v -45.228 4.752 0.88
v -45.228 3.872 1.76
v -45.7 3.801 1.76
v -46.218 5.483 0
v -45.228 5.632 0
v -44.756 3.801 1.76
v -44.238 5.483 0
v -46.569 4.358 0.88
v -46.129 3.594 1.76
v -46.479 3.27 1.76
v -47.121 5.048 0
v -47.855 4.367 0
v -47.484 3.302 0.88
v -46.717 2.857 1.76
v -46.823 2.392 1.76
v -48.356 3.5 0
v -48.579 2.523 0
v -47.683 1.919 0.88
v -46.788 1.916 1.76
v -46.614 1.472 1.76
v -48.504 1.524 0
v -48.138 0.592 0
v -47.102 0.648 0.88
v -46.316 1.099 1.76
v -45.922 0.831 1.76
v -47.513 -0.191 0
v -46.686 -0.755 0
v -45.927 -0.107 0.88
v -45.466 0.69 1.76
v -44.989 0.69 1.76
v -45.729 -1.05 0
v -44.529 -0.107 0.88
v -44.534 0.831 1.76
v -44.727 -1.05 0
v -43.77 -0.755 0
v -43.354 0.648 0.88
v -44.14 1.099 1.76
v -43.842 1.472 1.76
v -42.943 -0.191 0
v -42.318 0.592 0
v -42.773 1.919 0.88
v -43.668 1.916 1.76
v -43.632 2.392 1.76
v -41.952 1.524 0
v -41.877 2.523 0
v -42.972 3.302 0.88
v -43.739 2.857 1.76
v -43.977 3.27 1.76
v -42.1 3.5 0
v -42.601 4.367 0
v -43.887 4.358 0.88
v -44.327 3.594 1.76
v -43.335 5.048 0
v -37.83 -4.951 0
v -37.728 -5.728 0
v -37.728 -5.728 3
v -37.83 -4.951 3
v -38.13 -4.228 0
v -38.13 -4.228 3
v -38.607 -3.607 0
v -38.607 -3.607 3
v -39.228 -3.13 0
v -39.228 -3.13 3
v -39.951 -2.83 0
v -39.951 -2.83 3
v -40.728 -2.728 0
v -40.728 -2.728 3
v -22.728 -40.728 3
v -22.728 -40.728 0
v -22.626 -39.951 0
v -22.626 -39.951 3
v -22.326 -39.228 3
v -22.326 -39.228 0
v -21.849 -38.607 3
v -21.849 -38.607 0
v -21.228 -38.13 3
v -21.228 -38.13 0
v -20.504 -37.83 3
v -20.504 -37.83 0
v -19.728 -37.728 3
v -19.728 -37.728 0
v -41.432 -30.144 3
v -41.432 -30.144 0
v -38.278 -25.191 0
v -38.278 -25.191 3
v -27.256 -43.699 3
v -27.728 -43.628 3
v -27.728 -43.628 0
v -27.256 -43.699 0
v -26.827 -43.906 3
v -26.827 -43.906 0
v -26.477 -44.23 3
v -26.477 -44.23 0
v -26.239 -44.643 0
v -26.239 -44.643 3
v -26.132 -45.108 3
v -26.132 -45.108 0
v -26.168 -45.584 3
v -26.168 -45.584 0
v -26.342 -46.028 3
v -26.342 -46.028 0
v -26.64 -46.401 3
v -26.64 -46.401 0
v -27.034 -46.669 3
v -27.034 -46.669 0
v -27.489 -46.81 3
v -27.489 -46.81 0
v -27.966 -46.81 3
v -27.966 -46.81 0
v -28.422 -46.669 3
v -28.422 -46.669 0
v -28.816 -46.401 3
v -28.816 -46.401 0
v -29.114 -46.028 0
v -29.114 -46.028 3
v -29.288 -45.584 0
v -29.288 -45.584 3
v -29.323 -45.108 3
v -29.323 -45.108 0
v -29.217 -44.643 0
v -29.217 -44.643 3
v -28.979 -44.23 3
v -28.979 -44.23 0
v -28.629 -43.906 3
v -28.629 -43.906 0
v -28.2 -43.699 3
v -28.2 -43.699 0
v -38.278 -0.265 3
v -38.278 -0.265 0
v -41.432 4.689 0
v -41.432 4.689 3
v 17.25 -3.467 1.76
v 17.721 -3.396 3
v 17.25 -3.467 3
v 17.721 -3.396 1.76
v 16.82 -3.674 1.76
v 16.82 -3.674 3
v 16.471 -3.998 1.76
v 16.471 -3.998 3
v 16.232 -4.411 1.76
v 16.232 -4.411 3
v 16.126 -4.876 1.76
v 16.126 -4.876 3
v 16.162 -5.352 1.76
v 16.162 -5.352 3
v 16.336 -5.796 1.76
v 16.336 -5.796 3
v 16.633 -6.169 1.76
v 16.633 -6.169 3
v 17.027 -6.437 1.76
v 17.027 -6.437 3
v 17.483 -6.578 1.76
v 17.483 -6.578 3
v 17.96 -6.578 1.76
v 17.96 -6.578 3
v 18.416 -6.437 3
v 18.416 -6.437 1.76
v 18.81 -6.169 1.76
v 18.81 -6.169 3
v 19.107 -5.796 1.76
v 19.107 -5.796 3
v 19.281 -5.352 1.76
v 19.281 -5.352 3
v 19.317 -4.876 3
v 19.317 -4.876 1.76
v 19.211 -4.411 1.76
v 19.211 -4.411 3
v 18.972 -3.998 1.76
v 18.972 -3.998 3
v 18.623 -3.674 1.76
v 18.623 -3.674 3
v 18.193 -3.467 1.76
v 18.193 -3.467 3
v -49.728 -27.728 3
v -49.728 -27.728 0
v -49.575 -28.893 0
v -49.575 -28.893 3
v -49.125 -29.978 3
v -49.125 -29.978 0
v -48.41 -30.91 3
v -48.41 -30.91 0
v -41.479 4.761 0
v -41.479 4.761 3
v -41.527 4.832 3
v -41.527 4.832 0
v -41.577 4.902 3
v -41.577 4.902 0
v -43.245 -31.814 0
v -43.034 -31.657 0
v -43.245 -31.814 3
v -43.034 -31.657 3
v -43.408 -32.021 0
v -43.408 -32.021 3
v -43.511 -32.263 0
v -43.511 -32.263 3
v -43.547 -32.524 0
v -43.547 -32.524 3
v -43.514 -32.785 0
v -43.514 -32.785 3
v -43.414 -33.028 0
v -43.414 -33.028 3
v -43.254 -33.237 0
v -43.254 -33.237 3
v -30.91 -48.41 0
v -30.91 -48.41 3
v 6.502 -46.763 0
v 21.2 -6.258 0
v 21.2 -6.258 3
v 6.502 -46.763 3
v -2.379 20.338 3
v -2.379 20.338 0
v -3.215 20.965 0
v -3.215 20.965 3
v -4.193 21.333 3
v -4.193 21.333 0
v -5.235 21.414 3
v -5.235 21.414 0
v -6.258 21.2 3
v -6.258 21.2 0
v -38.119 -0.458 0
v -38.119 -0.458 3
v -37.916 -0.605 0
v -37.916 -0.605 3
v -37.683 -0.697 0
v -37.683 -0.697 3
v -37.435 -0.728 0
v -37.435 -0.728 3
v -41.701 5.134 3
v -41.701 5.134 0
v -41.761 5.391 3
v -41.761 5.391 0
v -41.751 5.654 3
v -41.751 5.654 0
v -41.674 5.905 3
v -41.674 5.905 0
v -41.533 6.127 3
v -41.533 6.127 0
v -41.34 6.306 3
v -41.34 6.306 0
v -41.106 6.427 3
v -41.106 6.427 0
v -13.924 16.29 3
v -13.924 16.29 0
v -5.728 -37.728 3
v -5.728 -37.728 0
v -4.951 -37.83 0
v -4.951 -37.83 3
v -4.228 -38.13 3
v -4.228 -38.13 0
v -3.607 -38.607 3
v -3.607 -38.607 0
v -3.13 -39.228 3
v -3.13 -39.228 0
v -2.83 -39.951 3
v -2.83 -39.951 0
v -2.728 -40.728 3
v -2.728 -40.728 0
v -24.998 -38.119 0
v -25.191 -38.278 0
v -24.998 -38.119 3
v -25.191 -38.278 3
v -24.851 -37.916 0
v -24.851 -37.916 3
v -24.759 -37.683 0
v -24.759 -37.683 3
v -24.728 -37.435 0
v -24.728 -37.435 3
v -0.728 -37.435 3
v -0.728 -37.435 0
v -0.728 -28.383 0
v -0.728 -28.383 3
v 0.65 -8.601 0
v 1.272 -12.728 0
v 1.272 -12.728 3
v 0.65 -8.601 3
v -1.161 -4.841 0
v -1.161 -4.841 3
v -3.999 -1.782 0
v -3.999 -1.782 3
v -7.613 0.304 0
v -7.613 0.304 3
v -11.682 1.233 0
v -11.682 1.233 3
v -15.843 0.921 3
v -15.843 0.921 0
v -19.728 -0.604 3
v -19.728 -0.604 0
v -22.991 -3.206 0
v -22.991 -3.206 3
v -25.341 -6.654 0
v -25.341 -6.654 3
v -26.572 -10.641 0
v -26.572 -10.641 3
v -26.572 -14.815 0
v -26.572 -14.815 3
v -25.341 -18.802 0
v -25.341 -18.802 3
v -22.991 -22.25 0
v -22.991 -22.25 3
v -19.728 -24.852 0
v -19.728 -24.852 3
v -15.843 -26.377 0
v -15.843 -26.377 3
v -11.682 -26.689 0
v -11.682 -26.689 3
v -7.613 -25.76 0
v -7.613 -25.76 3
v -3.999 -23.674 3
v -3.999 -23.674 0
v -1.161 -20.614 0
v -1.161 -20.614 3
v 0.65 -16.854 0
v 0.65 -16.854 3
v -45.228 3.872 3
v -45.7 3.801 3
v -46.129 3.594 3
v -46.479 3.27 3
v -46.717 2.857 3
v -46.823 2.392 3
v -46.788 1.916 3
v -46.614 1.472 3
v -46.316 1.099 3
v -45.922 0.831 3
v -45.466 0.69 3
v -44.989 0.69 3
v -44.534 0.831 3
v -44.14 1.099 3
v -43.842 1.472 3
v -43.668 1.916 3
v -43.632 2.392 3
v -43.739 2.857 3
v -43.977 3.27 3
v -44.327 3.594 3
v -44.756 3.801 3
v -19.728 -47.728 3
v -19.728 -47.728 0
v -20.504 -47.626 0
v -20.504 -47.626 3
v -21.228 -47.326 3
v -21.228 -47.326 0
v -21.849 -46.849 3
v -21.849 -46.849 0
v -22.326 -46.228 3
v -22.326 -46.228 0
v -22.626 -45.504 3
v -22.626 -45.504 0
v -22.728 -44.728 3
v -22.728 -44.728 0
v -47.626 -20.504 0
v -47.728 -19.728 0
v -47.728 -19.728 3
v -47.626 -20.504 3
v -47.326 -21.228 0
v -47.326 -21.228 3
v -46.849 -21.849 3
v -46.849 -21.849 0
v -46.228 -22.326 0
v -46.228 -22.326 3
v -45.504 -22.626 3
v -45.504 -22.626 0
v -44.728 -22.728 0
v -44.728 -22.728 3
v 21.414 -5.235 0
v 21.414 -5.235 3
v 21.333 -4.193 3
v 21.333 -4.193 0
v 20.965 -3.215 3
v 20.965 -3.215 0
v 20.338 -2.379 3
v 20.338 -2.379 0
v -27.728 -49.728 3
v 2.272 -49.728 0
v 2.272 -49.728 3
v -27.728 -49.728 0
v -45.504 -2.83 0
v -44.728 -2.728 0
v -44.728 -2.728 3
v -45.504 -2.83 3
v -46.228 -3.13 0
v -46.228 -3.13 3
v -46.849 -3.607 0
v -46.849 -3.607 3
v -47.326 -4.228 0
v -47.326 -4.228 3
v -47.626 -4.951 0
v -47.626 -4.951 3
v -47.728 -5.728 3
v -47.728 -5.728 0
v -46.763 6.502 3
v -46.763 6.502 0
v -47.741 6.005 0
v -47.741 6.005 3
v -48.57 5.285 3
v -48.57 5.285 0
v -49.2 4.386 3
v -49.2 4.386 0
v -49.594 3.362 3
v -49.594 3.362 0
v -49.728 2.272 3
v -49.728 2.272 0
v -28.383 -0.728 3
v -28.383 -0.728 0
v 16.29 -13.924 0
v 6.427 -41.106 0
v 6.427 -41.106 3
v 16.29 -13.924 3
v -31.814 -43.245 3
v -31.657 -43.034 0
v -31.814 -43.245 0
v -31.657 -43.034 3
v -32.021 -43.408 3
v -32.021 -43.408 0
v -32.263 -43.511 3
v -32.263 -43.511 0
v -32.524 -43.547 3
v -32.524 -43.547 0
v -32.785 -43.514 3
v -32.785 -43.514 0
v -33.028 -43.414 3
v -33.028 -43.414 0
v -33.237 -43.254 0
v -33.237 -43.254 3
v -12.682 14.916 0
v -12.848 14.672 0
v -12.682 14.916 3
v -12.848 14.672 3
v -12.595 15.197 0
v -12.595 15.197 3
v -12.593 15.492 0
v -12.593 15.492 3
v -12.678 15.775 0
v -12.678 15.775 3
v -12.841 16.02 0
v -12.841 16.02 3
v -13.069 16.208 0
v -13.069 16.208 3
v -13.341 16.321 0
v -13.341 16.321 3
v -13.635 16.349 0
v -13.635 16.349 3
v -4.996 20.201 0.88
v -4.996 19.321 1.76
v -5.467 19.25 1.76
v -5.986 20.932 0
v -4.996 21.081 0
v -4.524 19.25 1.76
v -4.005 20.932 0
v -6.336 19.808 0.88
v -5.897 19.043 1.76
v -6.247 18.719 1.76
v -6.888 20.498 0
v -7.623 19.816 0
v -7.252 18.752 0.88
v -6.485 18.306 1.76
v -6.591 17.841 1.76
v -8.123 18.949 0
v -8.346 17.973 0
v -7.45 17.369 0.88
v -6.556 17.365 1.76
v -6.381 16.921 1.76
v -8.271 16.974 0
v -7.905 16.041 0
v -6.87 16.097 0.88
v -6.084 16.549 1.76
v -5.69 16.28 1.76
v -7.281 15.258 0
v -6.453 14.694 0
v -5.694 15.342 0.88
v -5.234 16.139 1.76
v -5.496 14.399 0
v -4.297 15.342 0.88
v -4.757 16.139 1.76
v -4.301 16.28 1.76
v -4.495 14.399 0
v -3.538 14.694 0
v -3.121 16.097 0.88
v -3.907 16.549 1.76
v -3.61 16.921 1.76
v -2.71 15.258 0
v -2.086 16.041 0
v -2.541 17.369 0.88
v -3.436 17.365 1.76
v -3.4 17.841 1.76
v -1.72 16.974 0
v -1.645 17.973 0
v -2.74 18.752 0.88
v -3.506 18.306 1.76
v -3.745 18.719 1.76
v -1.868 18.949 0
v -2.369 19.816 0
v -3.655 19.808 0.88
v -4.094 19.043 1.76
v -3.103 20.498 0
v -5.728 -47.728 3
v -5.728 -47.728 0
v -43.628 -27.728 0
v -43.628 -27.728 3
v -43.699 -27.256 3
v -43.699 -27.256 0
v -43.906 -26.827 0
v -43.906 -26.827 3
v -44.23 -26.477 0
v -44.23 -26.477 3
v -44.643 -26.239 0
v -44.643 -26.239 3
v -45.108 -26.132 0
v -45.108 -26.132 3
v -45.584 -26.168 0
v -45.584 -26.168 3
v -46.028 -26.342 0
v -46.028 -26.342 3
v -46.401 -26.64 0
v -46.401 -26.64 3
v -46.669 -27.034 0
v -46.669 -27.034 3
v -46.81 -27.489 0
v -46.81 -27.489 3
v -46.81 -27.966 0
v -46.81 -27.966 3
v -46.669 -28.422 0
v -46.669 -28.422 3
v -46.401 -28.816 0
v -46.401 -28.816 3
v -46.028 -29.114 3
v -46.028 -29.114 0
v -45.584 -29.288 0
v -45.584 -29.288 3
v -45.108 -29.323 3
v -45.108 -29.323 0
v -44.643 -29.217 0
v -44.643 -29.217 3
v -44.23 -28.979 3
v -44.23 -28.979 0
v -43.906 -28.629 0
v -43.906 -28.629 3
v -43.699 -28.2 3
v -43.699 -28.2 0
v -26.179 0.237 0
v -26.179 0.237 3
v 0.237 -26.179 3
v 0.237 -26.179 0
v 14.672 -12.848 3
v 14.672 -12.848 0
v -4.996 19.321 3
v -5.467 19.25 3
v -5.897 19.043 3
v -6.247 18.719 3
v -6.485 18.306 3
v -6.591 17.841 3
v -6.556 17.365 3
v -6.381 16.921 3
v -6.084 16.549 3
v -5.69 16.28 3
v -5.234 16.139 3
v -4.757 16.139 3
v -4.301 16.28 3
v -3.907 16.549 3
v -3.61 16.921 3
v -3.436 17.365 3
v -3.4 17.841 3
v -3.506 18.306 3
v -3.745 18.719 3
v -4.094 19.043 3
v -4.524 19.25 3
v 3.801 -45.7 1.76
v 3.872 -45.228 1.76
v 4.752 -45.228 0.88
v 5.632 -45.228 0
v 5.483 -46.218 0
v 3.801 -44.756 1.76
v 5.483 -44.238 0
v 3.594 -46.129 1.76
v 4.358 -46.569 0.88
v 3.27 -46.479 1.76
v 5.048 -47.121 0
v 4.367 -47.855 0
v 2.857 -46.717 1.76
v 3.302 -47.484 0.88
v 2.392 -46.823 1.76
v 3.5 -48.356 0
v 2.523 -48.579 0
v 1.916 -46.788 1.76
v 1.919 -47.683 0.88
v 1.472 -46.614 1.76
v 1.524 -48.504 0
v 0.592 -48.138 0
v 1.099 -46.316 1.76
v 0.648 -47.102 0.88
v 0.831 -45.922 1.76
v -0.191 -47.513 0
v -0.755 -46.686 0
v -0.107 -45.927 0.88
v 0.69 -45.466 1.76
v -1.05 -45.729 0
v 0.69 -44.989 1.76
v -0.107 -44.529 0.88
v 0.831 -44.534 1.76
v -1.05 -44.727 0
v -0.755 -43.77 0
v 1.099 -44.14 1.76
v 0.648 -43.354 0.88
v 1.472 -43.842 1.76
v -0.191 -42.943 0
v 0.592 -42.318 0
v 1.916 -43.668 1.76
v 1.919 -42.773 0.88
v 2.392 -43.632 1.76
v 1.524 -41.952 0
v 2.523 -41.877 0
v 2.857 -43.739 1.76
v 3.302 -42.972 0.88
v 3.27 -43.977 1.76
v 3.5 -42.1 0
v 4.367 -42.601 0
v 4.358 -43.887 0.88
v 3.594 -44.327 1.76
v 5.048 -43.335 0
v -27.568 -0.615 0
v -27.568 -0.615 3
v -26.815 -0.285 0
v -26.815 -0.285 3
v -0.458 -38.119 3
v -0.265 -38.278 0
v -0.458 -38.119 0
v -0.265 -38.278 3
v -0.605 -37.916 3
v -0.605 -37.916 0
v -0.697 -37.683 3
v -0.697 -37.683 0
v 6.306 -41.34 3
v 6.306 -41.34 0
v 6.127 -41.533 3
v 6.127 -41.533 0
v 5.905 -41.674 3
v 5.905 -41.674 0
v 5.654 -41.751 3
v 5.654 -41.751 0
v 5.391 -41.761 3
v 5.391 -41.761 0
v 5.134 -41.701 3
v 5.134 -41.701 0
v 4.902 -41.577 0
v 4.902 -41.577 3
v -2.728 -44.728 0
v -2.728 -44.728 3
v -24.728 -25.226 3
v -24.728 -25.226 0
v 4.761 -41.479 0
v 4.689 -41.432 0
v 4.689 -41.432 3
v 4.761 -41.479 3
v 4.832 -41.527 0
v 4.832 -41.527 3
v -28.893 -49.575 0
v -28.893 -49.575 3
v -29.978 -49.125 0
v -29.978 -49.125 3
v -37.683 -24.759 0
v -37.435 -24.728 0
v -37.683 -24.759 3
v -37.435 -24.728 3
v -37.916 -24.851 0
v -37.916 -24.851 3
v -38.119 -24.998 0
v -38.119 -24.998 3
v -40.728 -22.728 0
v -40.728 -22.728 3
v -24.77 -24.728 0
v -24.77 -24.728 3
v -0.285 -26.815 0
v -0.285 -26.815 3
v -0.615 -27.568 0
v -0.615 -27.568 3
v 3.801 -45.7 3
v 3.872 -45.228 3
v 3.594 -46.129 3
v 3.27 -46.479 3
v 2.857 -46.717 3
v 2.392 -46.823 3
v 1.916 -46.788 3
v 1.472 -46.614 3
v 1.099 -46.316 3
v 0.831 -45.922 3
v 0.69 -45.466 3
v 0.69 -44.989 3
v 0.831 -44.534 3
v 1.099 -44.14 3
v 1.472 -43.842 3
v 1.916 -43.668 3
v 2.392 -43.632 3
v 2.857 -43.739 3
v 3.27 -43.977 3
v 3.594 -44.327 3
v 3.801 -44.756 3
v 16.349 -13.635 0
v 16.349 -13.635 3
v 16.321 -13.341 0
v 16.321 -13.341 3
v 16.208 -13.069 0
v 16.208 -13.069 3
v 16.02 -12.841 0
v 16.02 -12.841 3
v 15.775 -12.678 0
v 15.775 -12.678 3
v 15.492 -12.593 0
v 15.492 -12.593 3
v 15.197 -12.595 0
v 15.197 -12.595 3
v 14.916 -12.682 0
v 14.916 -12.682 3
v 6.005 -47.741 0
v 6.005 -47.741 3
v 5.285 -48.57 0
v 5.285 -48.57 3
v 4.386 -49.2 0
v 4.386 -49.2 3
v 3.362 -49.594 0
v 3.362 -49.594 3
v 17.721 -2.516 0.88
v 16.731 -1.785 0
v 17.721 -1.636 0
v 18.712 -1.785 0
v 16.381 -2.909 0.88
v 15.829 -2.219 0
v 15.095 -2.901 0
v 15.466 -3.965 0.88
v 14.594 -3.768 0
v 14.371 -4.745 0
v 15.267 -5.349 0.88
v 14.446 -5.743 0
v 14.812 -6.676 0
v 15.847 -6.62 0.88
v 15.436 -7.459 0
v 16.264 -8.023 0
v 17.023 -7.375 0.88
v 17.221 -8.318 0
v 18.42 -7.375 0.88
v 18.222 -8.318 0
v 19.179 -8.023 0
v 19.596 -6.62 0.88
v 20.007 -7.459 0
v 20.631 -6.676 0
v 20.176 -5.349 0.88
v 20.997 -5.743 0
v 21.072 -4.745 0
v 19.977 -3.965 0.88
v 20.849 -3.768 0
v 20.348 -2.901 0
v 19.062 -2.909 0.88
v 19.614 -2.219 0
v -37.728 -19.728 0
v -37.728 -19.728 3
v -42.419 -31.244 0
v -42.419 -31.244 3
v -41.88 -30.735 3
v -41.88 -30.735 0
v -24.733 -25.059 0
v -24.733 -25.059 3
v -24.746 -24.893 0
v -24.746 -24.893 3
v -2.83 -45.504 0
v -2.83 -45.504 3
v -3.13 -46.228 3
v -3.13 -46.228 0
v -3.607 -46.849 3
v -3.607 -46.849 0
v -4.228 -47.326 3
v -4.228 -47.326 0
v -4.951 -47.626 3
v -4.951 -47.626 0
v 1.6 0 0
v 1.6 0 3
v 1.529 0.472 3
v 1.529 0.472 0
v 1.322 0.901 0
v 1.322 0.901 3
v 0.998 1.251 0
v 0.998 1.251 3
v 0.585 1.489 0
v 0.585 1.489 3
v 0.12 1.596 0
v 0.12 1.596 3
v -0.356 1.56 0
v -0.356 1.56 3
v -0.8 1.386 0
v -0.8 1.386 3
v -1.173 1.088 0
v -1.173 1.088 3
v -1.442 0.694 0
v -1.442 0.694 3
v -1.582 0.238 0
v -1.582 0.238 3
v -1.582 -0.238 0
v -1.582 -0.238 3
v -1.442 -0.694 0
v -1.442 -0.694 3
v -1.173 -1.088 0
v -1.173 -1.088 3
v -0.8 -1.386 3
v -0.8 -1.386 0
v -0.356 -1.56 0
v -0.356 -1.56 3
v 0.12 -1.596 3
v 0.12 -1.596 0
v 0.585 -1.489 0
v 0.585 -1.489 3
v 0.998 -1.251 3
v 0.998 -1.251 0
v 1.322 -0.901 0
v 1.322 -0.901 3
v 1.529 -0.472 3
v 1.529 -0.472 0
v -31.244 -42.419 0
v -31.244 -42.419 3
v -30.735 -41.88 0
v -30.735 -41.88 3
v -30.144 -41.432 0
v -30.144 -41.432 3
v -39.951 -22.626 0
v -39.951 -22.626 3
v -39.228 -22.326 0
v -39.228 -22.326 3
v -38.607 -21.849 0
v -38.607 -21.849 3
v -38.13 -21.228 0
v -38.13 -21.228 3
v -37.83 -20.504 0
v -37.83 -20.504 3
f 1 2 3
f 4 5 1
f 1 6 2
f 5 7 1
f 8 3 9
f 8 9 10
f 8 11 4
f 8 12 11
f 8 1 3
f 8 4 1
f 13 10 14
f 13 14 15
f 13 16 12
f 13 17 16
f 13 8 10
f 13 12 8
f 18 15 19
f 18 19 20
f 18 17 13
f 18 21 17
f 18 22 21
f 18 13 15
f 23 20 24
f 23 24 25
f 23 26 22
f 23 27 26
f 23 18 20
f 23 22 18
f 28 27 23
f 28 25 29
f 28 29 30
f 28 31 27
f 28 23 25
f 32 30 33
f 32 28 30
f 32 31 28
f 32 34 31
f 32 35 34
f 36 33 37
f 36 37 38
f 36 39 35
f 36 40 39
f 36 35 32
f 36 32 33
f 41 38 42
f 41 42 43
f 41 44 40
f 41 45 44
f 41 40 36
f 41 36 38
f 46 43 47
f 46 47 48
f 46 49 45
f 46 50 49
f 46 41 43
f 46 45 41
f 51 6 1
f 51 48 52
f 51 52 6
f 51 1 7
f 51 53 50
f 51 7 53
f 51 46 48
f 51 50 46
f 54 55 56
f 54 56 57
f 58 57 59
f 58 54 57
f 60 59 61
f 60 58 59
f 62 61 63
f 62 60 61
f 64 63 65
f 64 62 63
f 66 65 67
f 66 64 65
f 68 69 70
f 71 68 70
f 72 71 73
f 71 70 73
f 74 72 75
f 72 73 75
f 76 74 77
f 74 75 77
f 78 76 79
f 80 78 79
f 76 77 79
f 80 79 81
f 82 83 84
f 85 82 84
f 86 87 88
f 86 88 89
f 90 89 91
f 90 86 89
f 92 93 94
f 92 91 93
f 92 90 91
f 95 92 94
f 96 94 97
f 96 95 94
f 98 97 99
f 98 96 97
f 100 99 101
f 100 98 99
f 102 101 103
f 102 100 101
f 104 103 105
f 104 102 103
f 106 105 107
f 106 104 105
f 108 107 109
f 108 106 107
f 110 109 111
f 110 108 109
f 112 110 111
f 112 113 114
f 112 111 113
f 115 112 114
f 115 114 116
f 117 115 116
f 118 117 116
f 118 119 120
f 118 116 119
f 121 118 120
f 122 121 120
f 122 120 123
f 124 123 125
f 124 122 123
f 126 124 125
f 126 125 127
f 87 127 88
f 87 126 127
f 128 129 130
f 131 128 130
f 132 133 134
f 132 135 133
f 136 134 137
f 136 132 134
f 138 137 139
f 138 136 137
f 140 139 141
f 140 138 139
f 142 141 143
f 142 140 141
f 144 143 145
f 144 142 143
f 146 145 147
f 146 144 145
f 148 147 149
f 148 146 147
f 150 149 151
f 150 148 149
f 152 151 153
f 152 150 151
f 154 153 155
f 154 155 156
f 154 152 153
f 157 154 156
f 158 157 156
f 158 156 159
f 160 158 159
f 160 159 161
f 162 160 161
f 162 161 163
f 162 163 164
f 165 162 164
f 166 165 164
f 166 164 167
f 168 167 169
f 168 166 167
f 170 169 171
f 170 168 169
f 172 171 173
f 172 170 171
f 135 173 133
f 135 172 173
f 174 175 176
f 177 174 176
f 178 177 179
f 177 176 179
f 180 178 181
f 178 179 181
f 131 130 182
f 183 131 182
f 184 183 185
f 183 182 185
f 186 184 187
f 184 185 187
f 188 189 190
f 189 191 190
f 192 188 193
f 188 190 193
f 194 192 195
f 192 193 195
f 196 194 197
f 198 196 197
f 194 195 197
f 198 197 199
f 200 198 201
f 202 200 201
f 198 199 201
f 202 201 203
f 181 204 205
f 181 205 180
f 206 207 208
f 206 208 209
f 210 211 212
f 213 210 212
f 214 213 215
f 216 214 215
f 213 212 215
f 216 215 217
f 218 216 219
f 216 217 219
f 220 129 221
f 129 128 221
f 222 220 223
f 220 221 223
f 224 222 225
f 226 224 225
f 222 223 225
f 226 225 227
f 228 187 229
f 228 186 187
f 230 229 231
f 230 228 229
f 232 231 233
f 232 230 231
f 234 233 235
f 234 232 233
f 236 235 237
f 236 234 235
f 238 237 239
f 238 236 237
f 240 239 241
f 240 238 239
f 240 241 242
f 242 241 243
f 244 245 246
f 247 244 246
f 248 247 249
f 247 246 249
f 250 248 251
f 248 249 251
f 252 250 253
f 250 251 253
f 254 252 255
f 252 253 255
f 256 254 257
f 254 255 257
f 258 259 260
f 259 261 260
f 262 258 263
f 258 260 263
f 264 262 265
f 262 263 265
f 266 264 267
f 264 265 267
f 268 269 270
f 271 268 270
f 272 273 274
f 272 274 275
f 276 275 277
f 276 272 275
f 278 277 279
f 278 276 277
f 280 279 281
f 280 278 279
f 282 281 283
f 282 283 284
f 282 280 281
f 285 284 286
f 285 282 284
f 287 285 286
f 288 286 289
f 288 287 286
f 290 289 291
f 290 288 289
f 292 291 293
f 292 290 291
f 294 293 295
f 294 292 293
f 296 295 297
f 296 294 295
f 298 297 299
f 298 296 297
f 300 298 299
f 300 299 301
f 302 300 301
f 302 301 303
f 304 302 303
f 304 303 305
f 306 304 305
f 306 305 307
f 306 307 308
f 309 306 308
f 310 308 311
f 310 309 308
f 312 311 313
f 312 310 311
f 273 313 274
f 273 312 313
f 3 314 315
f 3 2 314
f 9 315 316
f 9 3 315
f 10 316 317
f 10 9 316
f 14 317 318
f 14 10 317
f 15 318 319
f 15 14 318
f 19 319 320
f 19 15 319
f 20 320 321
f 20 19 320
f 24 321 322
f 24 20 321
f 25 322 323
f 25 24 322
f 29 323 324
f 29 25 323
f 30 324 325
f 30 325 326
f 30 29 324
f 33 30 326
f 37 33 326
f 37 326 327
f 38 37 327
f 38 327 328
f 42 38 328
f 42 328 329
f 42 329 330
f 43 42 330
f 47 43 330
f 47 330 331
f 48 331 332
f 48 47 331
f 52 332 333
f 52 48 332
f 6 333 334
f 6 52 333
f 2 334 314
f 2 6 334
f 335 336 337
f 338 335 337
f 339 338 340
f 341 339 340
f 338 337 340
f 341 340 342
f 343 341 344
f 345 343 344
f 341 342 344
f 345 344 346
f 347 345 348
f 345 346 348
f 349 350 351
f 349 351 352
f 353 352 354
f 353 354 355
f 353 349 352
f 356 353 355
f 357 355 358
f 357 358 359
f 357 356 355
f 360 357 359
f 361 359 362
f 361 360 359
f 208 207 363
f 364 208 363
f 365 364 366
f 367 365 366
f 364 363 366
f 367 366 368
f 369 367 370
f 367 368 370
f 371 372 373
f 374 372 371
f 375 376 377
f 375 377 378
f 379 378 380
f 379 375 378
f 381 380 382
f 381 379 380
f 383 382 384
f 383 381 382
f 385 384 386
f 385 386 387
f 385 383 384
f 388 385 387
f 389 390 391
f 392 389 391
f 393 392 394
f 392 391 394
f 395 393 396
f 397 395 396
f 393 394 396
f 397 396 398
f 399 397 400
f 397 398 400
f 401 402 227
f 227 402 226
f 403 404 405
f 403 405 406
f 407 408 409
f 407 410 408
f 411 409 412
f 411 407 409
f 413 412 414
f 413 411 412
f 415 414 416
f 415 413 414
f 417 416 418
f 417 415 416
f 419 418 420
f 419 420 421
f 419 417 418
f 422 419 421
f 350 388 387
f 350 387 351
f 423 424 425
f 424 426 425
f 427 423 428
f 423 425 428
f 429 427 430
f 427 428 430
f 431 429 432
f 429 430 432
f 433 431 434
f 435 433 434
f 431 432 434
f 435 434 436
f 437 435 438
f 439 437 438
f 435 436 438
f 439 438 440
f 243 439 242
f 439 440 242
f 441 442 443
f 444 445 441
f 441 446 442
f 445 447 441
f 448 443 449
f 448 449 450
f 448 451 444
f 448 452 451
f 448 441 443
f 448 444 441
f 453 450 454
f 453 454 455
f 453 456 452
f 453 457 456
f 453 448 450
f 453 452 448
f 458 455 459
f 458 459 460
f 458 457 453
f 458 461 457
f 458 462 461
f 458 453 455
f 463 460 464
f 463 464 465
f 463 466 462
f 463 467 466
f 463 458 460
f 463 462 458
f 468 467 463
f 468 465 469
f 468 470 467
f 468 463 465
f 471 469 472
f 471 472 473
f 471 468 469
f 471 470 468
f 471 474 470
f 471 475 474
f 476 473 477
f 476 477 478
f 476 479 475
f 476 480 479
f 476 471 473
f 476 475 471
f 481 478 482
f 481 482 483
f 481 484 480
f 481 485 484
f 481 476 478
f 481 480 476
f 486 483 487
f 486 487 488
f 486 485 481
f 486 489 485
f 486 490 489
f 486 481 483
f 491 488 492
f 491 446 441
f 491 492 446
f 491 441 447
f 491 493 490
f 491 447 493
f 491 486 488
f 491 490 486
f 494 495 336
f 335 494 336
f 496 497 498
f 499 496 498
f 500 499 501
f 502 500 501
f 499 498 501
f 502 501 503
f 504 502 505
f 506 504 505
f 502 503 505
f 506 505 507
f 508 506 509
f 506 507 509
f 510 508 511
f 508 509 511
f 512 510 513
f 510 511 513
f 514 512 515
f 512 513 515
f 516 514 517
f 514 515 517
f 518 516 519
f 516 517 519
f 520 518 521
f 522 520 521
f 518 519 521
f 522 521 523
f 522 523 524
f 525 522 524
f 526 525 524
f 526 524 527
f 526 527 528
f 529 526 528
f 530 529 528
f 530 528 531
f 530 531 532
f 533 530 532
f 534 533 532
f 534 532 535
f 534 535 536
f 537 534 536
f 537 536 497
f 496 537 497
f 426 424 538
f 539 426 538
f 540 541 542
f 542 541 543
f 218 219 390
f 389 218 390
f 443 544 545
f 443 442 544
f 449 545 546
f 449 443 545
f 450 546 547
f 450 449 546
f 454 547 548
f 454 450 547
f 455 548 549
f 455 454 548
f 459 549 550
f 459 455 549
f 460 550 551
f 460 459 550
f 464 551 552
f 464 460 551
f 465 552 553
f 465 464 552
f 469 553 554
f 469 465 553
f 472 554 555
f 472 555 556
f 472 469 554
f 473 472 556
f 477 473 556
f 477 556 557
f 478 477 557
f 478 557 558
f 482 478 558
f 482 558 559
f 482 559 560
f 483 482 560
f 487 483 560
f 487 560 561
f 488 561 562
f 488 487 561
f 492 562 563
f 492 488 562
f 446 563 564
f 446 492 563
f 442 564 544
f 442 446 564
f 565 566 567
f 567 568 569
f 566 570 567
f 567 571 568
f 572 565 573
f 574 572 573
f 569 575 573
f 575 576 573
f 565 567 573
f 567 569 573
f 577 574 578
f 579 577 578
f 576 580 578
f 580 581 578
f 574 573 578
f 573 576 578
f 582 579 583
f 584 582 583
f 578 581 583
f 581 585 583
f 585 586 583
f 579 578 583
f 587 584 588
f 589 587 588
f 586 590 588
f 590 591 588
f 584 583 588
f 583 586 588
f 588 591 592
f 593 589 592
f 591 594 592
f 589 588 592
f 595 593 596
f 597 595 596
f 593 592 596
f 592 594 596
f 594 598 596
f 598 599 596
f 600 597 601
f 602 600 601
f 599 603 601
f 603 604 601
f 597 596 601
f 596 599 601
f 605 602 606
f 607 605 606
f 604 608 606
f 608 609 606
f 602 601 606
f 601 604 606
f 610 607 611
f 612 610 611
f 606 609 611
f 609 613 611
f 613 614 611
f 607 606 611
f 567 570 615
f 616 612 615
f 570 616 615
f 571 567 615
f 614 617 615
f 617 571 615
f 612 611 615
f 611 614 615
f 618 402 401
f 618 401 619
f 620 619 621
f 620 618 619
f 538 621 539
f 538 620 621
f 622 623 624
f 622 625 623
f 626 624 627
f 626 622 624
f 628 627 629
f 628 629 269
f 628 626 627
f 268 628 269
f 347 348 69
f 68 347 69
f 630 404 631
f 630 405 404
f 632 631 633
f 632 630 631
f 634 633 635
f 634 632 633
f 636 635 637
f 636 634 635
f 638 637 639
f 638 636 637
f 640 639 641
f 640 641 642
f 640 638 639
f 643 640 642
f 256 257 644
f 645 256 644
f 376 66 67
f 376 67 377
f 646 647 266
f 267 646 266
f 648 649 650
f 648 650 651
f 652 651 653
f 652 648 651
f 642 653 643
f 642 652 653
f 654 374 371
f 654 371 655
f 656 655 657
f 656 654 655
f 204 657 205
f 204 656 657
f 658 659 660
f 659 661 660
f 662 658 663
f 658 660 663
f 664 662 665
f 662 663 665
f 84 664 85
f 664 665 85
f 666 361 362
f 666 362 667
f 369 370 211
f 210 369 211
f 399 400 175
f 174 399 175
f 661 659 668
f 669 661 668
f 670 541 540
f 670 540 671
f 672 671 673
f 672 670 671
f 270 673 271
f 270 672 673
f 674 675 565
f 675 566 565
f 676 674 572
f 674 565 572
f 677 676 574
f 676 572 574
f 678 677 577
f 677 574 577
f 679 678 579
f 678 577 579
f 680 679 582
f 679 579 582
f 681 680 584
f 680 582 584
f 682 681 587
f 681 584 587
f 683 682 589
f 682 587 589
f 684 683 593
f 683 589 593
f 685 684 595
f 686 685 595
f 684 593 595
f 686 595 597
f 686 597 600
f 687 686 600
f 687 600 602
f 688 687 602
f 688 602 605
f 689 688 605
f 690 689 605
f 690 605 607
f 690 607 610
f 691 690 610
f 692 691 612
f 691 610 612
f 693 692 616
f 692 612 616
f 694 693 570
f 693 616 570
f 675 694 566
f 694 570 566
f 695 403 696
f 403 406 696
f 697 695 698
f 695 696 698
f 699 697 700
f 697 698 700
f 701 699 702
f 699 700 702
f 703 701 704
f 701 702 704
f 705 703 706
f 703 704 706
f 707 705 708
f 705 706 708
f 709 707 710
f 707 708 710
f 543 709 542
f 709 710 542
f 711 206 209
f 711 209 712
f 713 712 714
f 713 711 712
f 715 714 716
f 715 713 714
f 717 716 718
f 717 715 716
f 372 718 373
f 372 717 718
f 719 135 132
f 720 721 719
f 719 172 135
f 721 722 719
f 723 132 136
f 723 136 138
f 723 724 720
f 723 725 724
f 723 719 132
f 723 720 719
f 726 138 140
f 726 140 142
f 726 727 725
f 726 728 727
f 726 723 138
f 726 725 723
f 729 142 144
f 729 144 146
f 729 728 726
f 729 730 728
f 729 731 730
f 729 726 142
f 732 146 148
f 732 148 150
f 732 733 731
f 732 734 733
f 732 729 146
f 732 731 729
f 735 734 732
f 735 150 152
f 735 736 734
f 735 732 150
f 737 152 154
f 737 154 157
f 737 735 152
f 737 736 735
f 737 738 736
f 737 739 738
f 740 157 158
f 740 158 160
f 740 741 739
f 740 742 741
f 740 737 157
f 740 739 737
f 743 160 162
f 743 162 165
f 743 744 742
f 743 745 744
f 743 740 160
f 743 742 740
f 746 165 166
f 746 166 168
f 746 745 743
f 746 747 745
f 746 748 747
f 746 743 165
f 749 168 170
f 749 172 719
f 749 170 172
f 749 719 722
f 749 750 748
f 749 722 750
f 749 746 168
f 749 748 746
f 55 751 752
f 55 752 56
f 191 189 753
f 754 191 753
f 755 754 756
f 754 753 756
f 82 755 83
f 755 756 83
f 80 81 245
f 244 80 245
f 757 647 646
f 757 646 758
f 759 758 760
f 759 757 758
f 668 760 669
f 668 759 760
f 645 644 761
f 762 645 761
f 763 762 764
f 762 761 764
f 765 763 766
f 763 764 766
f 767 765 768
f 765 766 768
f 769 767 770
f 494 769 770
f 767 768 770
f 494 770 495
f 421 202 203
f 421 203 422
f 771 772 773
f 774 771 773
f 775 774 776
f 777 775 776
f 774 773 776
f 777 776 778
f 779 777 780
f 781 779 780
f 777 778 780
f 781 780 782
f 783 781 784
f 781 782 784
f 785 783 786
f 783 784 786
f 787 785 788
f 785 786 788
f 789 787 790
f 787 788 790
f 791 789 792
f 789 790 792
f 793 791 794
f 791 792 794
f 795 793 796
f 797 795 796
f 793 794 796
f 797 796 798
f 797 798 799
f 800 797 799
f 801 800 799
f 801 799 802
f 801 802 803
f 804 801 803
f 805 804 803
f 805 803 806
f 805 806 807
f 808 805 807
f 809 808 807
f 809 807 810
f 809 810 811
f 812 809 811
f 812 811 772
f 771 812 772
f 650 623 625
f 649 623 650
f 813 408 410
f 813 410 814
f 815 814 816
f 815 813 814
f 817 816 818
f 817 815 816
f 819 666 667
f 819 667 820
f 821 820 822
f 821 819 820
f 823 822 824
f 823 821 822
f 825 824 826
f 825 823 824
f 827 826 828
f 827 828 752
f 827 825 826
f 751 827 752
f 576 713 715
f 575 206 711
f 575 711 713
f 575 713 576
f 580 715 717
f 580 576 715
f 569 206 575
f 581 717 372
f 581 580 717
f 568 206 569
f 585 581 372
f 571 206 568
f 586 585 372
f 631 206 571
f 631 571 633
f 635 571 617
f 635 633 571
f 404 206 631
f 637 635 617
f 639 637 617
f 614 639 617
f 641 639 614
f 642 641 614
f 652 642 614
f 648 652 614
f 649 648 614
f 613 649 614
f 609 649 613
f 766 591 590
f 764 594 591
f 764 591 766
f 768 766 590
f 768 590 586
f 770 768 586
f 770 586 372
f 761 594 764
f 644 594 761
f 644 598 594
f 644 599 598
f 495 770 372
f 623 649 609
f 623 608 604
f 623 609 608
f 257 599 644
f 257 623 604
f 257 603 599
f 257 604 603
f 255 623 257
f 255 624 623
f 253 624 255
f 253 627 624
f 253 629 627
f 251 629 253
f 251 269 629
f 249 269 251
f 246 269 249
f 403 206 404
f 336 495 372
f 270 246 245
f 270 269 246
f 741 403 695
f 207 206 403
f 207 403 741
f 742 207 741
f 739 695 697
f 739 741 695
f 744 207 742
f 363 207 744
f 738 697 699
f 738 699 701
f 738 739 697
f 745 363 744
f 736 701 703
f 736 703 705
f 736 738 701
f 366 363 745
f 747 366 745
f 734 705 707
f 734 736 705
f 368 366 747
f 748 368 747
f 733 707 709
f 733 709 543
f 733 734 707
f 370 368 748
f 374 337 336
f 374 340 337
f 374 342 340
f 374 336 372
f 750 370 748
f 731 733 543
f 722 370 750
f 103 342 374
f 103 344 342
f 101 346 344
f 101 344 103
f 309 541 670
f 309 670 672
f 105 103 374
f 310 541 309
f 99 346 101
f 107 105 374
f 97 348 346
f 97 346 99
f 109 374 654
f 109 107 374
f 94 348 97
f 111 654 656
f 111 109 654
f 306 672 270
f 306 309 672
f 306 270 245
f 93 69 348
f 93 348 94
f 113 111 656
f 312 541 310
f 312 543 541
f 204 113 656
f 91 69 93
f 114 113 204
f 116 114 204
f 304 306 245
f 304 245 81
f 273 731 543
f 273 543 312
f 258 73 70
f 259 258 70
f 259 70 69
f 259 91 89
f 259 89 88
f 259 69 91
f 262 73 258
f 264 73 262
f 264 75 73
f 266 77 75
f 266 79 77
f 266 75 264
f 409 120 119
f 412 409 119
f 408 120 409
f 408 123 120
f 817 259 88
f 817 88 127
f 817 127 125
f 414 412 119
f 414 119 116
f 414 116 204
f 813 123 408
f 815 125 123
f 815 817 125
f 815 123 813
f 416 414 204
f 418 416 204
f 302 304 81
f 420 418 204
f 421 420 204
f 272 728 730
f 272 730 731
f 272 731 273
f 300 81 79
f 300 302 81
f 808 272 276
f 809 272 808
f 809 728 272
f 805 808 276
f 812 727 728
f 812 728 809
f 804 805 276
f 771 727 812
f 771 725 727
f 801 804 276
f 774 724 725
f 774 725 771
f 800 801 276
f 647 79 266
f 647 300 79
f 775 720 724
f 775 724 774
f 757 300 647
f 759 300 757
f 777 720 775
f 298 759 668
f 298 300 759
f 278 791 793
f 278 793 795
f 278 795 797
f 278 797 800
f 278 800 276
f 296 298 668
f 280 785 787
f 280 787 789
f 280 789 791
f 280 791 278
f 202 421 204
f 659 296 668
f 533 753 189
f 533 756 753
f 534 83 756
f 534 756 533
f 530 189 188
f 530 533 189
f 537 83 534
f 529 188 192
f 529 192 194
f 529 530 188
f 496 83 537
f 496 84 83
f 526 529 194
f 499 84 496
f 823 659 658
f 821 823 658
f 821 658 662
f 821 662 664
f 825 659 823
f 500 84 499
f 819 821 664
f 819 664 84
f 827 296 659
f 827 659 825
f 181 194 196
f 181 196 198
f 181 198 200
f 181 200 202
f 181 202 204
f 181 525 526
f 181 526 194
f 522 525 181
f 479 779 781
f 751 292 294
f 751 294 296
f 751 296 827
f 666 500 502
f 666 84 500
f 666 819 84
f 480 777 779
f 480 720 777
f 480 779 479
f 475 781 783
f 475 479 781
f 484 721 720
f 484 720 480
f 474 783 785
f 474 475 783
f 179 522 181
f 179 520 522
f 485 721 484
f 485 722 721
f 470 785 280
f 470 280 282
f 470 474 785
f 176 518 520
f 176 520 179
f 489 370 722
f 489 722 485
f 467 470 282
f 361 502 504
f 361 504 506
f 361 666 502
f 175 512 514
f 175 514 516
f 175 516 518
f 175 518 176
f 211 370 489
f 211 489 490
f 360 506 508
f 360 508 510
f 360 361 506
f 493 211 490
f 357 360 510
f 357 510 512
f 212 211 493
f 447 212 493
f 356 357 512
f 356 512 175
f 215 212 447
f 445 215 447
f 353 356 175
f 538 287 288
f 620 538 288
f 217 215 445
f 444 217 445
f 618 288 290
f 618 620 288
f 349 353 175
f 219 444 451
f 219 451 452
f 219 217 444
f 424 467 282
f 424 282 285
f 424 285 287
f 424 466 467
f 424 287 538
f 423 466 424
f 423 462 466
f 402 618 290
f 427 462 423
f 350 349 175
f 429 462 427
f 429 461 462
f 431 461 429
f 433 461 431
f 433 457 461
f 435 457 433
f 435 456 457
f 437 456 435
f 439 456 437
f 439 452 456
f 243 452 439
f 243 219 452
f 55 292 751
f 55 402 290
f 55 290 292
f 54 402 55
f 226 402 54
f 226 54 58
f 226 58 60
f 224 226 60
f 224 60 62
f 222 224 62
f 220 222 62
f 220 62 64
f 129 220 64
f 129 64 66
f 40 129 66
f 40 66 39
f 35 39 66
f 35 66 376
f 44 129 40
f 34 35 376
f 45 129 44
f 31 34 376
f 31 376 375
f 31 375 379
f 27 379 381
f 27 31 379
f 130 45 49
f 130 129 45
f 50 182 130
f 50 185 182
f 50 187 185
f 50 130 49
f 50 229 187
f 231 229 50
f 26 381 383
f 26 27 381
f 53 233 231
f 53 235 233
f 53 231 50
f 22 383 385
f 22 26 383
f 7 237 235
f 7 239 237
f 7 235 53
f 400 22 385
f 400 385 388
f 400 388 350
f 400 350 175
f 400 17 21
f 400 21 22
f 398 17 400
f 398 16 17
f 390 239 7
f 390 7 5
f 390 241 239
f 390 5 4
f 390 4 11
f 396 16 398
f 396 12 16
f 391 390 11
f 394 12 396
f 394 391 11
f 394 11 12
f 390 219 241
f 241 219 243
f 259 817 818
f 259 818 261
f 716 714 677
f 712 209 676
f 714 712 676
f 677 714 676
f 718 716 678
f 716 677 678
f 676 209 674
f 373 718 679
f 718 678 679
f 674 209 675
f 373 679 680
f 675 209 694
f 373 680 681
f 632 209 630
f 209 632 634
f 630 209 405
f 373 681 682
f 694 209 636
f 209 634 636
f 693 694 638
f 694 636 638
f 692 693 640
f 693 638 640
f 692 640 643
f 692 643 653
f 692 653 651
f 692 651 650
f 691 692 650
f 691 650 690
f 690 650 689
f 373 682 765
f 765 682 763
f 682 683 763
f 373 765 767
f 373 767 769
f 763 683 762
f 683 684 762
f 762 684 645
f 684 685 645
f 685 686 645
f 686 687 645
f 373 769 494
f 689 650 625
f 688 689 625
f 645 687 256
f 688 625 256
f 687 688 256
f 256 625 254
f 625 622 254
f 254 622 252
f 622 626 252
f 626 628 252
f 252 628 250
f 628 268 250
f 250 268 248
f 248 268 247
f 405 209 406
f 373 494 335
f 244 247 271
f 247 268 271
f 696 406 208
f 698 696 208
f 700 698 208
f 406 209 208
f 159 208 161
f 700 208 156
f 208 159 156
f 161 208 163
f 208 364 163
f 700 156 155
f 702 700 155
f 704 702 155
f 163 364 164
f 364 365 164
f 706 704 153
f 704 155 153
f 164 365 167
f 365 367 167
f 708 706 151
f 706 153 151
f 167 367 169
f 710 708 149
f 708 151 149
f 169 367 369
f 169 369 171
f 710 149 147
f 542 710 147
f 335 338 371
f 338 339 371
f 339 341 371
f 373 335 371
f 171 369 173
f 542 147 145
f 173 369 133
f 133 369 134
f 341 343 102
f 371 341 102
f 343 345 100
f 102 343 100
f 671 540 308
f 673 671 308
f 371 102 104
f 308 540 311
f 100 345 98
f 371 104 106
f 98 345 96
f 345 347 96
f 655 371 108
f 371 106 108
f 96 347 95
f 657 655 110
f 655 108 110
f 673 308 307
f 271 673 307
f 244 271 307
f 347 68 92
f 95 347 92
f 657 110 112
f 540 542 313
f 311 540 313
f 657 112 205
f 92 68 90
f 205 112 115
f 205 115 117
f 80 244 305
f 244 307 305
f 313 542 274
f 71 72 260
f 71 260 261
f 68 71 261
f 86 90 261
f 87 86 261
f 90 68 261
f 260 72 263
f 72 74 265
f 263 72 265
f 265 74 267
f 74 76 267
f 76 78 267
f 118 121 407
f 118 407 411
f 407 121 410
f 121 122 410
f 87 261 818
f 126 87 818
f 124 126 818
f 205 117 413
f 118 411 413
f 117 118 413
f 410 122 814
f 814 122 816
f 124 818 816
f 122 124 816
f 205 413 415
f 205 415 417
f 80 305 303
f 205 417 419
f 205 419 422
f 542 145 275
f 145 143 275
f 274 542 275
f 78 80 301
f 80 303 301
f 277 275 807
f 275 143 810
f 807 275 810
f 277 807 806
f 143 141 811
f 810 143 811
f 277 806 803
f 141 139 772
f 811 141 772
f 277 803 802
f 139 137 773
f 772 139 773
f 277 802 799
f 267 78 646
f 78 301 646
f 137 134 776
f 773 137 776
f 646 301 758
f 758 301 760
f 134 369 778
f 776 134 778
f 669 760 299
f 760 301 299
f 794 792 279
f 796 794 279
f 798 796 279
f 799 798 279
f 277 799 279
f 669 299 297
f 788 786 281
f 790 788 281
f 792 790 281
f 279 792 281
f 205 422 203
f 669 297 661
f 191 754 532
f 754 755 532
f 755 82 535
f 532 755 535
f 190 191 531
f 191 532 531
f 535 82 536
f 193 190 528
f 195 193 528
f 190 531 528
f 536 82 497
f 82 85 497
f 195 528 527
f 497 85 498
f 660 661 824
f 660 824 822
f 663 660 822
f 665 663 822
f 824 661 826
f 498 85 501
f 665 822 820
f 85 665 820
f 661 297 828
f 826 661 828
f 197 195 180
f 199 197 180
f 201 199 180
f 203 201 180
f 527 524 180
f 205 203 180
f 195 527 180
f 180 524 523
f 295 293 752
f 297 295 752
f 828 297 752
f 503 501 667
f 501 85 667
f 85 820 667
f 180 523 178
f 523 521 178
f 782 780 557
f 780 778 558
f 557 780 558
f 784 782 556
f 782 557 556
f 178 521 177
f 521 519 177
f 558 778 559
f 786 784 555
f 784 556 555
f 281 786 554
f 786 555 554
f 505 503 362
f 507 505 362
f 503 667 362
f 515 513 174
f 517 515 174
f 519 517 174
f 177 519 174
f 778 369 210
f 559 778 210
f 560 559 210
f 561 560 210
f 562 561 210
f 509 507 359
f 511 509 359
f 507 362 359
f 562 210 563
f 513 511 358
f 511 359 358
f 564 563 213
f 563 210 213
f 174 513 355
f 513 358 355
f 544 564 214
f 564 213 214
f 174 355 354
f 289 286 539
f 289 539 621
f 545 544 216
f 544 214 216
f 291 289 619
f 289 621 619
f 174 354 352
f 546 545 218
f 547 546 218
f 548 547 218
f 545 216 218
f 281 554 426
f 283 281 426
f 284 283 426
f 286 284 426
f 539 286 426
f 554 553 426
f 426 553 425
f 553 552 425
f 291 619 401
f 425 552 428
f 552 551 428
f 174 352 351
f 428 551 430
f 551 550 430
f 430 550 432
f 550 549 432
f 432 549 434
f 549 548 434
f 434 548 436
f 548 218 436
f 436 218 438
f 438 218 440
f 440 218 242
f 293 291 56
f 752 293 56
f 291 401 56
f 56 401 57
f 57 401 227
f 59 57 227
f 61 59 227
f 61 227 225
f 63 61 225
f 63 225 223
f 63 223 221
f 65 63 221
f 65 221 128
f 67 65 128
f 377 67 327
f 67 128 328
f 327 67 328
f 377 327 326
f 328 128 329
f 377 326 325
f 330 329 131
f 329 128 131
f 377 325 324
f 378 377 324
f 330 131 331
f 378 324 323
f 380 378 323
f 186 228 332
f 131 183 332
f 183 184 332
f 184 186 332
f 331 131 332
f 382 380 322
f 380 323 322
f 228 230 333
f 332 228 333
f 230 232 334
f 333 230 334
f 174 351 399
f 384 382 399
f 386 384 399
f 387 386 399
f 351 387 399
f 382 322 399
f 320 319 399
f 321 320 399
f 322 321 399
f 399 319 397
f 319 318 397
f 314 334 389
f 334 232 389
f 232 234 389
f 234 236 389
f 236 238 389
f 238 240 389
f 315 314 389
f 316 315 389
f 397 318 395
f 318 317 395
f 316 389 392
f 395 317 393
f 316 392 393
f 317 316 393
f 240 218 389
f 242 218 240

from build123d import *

# Parameters (mm, degrees)
SKETCH1_R                    = 14
BOSS_EXTRUDE1_DEPTH          = 3
FILLET1_R                    = 3
M3_CLEARANCE_HOLE1_D         = 3.2
CSK_FOR_M3_SFHCS1_AT_2_COUNT = 2
CSK_FOR_M3_SFHCS1_AT_2_PITCH = 32.126856443
BOSS_EXTRUDE3_START          = -3
BOSS_EXTRUDE3_DEPTH          = 3
M3_CLEARANCE_HOLE2_D         = 3.2
BOSS_EXTRUDE4_DEPTH          = 3
FILLET2_R                    = 1


with BuildPart() as part:
    # Sketch1 → Boss-Extrude1 (new body)
    with BuildSketch(Plane.XY):
        with BuildLine():
            Line((-7.713858659, 20.231714727), (-27.069818728, -0.727922061))
            Line((-27.069818728, -0.727922061), (-40.727922061, -0.727922061))
            Line((-40.727922061, -0.727922061), (-44.727922061, -0.727922061))
            ThreePointArc((-44.727922061, -0.727922061), (-48.263455967, -2.192388155), (-49.727922061, -5.727922061))
            Line((-49.727922061, -5.727922061), (-49.727922061, -19.727922061))
            ThreePointArc((-49.727922061, -19.727922061), (-48.263455967, -23.263455967), (-44.727922061, -24.727922061))
            Line((-44.727922061, -24.727922061), (-40.727922061, -24.727922061))
            Line((-40.727922061, -24.727922061), (-24.76951664, -24.727922061))
            ThreePointArc((-24.76951664, -24.727922061), (-24.748737342, -24.748737342), (-24.727922061, -24.76951664))
            Line((-24.727922061, -24.76951664), (-24.727922061, -40.727922061))
            Line((-24.727922061, -40.727922061), (-24.727922061, -44.727922061))
            ThreePointArc((-24.727922061, -44.727922061), (-23.263455967, -48.263455967), (-19.727922061, -49.727922061))
            Line((-19.727922061, -49.727922061), (-5.727922061, -49.727922061))
            ThreePointArc((-5.727922061, -49.727922061), (-2.192388155, -48.263455967), (-0.727922061, -44.727922061))
            Line((-0.727922061, -44.727922061), (-0.727922061, -40.727922061))
            Line((-0.727922061, -40.727922061), (-0.727922061, -27.069818728))
            Line((-0.727922061, -27.069818728), (20.231714727, -7.713858659))
            ThreePointArc((20.231714727, -7.713858659), (21.420744979, -5.069187867), (20.337771086, -2.379346963))
            Line((20.337771086, -2.379346963), (-2.379346963, 20.337771086))
            ThreePointArc((-2.379346963, 20.337771086), (-5.069187867, 21.420744979), (-7.713858659, 20.231714727))
        make_face()
        with Locations((-12.727922061, -12.727922061)):
            Circle(SKETCH1_R, mode=Mode.SUBTRACT)
        with BuildLine():
            Line((-44.727922061, -22.727922061), (-40.727922061, -22.727922061))
            ThreePointArc((-40.727922061, -22.727922061), (-38.606601718, -21.849242405), (-37.727922061, -19.727922061))
            Line((-37.727922061, -19.727922061), (-37.727922061, -5.727922061))
            ThreePointArc((-37.727922061, -5.727922061), (-38.606601718, -3.606601718), (-40.727922061, -2.727922061))
            Line((-40.727922061, -2.727922061), (-44.727922061, -2.727922061))
            ThreePointArc((-44.727922061, -2.727922061), (-46.849242405, -3.606601718), (-47.727922061, -5.727922061))
            Line((-47.727922061, -5.727922061), (-47.727922061, -19.727922061))
            ThreePointArc((-47.727922061, -19.727922061), (-46.849242405, -21.849242405), (-44.727922061, -22.727922061))
        make_face(mode=Mode.SUBTRACT)
        with BuildLine():
            Line((-19.727922061, -37.727922061), (-5.727922061, -37.727922061))
            ThreePointArc((-5.727922061, -37.727922061), (-3.606601718, -38.606601718), (-2.727922061, -40.727922061))
            Line((-2.727922061, -40.727922061), (-2.727922061, -44.727922061))
            ThreePointArc((-2.727922061, -44.727922061), (-3.606601718, -46.849242405), (-5.727922061, -47.727922061))
            Line((-5.727922061, -47.727922061), (-19.727922061, -47.727922061))
            ThreePointArc((-19.727922061, -47.727922061), (-21.849242405, -46.849242405), (-22.727922061, -44.727922061))
            Line((-22.727922061, -44.727922061), (-22.727922061, -40.727922061))
            ThreePointArc((-22.727922061, -40.727922061), (-21.849242405, -38.606601718), (-19.727922061, -37.727922061))
        make_face(mode=Mode.SUBTRACT)
    extrude(amount=BOSS_EXTRUDE1_DEPTH)

    # Fillet1
    # the kernel refuses this fillet: 3 mm, written as the material it adds along each edge
    with BuildSketch(Plane(origin=(-0.727922061, -27.069818728, 0), x_dir=(0.734653136445674, 0.6784429004054313, 0), z_dir=(0, 0, 1)), Plane(origin=(-27.069818728, -0.727922061, 0), x_dir=(-1, 0, 0), z_dir=(0, 0, 1))) as fillet1_piece_1:
        with BuildLine():
            CenterArc((FILLET1_R * 0.437699212924, -FILLET1_R), FILLET1_R, 90, 47.277914711)
            Line((-FILLET1_R * 0.296953923521, -FILLET1_R * 0.321557099595), (-FILLET1_R * 0.31164698625, -FILLET1_R * 0.307988241586))
            Line((-FILLET1_R * 0.31164698625, -FILLET1_R * 0.307988241586), (-FILLET1_R * 0.00875398425848, FILLET1_R * 0.02))
            Line((-FILLET1_R * 0.00875398425848, FILLET1_R * 0.02), (FILLET1_R * 0.437699212924, FILLET1_R * 0.02))
            Line((FILLET1_R * 0.437699212924, FILLET1_R * 0.02), (FILLET1_R * 0.437699212924, 0))
        make_face()
    extrude(amount=3)
    with BuildSketch(Plane(origin=(-24.727922061, -24.76951664, 0), x_dir=(-0.7071067811869401, 0.707106781186155, 0), z_dir=(0, 0, 1))) as fillet1_piece_2:
        with BuildLine():
            CenterArc((1.798711298, 2.443929389), FILLET1_R, 225, 9.552090636)
            Line((-0.322609046, 0.322609046), (-0.365035452, 0.280182639))
            Line((-0.365035452, 0.280182639), (-0.042426407, -0.042426407))
            Line((-0.042426407, -0.042426407), (0.000103806, -0.05999991))
            ThreePointArc((0.000103806, -0.05999991), (0.029411809, -0.059974557), (0.024025864, -0.048878588))
            Line((0.024025864, -0.048878588), (0.058823617, 0))
        make_face()
    extrude(amount=3)

    # M3 Clearance Hole1 (through all)
    with Locations(Plane(origin=(0, 0, 0), x_dir=(-1, 0, 0), z_dir=(0, 0, -1))):
        with Locations((0, 0)):
            Hole(M3_CLEARANCE_HOLE1_D / 2)

    # Sketch5 → CSK for M3 SFHCS1 (revolve, cut)
    with BuildSketch(Plane(origin=(-4.995642054, 17.721475995, 0), x_dir=(0, 1, 0), z_dir=(1, 0, 0))):
        Polygon((0, 0), (0, 3), (1.6, 3), (1.6, 1.76), (3.36, 0), align=None)
    csk_for_m3_sfhcs1 = revolve(axis=Axis((-4.995642054, 17.721475995, -6.35), (0, 0, 1)), mode=Mode.SUBTRACT)

    # CSK for M3 SFHCS1 at 2: CSK for M3 SFHCS1 ×2
    with Locations(*[Vector(0.7071067811865475, -0.7071067811865477, 0) * (i * CSK_FOR_M3_SFHCS1_AT_2_PITCH) for i in range(1, CSK_FOR_M3_SFHCS1_AT_2_COUNT)]):
        add(csk_for_m3_sfhcs1, mode=Mode.SUBTRACT)

    # Sketch8 → Boss-Extrude3 (add)
    with BuildSketch(Plane.XY.offset(3).offset(BOSS_EXTRUDE3_START)):
        with BuildLine():
            Line((-49.727922061, 2.272077939), (-49.727922061, -5.727922061))
            ThreePointArc((-49.727922061, -5.727922061), (-48.263455967, -2.192388155), (-44.727922061, -0.727922061))
            Line((-44.727922061, -0.727922061), (-37.983715361, -0.727922061))
            Line((-37.983715361, -0.727922061), (-41.431833634, 4.688627679))
            ThreePointArc((-41.431833634, 4.688627679), (-46.486413634, 6.592517611), (-49.727922061, 2.272077939))
        make_face()
        with BuildLine():
            Line((-41.431833634, -30.144471802), (-37.983715361, -24.727922061))
            Line((-37.983715361, -24.727922061), (-44.727922061, -24.727922061))
            ThreePointArc((-44.727922061, -24.727922061), (-48.263455967, -23.263455967), (-49.727922061, -19.727922061))
            Line((-49.727922061, -19.727922061), (-49.727922061, -27.727922061))
            ThreePointArc((-49.727922061, -27.727922061), (-46.486413634, -32.048361734), (-41.431833634, -30.144471802))
        make_face()
    boss_extrude3 = extrude(amount=BOSS_EXTRUDE3_DEPTH)

    # Sketch10 → CSK for M3 SFHCS2 (revolve, cut)
    with BuildSketch(Plane(origin=(-45.227922061, 2.272077939, 0), x_dir=(0, 1, 0), z_dir=(1, 0, 0))):
        Polygon((0, 0), (0, 3), (1.6, 3), (1.6, 1.76), (3.36, 0), align=None)
    csk_for_m3_sfhcs2 = revolve(axis=Axis((-45.227922061, 2.272077939, -6.35), (0, 0, 1)), mode=Mode.SUBTRACT)

    # M3 Clearance Hole2 (through all)
    with Locations(Plane(origin=(0, 0, 0), x_dir=(-1, 0, 0), z_dir=(0, 0, -1))):
        with Locations((45.227922061, -27.727922061)):
            m3_clearance_hole2 = Hole(M3_CLEARANCE_HOLE2_D / 2)

    # Mirror1: Boss-Extrude3, CSK for M3 SFHCS2, M3 Clearance Hole2 across plane
    add(boss_extrude3.mirror(Plane(origin=(0, 0, 0), x_dir=(0, 0, 1), z_dir=(-0.7071067811865475, 0.7071067811865477, 0))))
    add(csk_for_m3_sfhcs2.mirror(Plane(origin=(0, 0, 0), x_dir=(0, 0, 1), z_dir=(-0.7071067811865475, 0.7071067811865477, 0))), mode=Mode.SUBTRACT)
    add(m3_clearance_hole2.mirror(Plane(origin=(0, 0, 0), x_dir=(0, 0, 1), z_dir=(-0.7071067811865475, 0.7071067811865477, 0))), mode=Mode.SUBTRACT)

    # Sketch13 → Boss-Extrude4 (add)
    with BuildSketch(Plane(origin=(0, 0, 0), x_dir=(-1, 0, 0), z_dir=(0, 0, -1))):
        with BuildLine():
            Line((-21.199587058, -6.257681448), (-6.502213015, -46.762834838))
            ThreePointArc((-6.502213015, -46.762834838), (-6.726271236, -44.587483093), (-5.898401366, -42.563381125))
            Line((-5.898401366, -42.563381125), (-17.692883881, -10.058436905))
            Line((-17.692883881, -10.058436905), (-20.231714727, -7.713858659))
            ThreePointArc((-20.231714727, -7.713858659), (-20.802903641, -7.043764039), (-21.199587058, -6.257681448))
        make_face()
        with BuildLine():
            Line((10.058436905, 17.692883881), (7.713858659, 20.231714727))
            ThreePointArc((7.713858659, 20.231714727), (7.043764039, 20.802903641), (6.257681448, 21.199587058))
            Line((6.257681448, 21.199587058), (46.762834838, 6.502213015))
            ThreePointArc((46.762834838, 6.502213015), (44.587483093, 6.726271236), (42.563381125, 5.898401366))
            Line((42.563381125, 5.898401366), (10.058436905, 17.692883881))
        make_face()
        with BuildLine():
            Line((30.909902577, -48.409902577), (48.409902577, -30.909902577))
            ThreePointArc((48.409902577, -30.909902577), (46.534165101, -32.034165101), (44.349937703, -32.141440325))
            Line((44.349937703, -32.141440325), (32.141440325, -44.349937703))
            ThreePointArc((32.141440325, -44.349937703), (32.034165101, -46.534165101), (30.909902577, -48.409902577))
        make_face()
    extrude(amount=-BOSS_EXTRUDE4_DEPTH)

    # Fillet2
    fillet2_edges = [part.edges().sort_by_distance(p)[0] for p in [
        (-37.983715361, -0.727922061, 1.5),
        (-37.983715361, -24.727922061, 1.5),
        (-0.727922061, -37.983715361, 1.5),
        (-24.727922061, -37.983715361, 1.5),
        (17.692883881, -10.058436905, 1.5),
        (5.898401366, -42.563381125, 1.5),
        (-42.563381125, 5.898401366, 1.5),
        (-10.058436905, 17.692883881, 1.5),
        (-32.141440325, -44.349937703, 1.5),
        (-44.349937703, -32.141440325, 1.5),
    ]]
    fillet(fillet2_edges, radius=FILLET2_R)


solid = part.part
